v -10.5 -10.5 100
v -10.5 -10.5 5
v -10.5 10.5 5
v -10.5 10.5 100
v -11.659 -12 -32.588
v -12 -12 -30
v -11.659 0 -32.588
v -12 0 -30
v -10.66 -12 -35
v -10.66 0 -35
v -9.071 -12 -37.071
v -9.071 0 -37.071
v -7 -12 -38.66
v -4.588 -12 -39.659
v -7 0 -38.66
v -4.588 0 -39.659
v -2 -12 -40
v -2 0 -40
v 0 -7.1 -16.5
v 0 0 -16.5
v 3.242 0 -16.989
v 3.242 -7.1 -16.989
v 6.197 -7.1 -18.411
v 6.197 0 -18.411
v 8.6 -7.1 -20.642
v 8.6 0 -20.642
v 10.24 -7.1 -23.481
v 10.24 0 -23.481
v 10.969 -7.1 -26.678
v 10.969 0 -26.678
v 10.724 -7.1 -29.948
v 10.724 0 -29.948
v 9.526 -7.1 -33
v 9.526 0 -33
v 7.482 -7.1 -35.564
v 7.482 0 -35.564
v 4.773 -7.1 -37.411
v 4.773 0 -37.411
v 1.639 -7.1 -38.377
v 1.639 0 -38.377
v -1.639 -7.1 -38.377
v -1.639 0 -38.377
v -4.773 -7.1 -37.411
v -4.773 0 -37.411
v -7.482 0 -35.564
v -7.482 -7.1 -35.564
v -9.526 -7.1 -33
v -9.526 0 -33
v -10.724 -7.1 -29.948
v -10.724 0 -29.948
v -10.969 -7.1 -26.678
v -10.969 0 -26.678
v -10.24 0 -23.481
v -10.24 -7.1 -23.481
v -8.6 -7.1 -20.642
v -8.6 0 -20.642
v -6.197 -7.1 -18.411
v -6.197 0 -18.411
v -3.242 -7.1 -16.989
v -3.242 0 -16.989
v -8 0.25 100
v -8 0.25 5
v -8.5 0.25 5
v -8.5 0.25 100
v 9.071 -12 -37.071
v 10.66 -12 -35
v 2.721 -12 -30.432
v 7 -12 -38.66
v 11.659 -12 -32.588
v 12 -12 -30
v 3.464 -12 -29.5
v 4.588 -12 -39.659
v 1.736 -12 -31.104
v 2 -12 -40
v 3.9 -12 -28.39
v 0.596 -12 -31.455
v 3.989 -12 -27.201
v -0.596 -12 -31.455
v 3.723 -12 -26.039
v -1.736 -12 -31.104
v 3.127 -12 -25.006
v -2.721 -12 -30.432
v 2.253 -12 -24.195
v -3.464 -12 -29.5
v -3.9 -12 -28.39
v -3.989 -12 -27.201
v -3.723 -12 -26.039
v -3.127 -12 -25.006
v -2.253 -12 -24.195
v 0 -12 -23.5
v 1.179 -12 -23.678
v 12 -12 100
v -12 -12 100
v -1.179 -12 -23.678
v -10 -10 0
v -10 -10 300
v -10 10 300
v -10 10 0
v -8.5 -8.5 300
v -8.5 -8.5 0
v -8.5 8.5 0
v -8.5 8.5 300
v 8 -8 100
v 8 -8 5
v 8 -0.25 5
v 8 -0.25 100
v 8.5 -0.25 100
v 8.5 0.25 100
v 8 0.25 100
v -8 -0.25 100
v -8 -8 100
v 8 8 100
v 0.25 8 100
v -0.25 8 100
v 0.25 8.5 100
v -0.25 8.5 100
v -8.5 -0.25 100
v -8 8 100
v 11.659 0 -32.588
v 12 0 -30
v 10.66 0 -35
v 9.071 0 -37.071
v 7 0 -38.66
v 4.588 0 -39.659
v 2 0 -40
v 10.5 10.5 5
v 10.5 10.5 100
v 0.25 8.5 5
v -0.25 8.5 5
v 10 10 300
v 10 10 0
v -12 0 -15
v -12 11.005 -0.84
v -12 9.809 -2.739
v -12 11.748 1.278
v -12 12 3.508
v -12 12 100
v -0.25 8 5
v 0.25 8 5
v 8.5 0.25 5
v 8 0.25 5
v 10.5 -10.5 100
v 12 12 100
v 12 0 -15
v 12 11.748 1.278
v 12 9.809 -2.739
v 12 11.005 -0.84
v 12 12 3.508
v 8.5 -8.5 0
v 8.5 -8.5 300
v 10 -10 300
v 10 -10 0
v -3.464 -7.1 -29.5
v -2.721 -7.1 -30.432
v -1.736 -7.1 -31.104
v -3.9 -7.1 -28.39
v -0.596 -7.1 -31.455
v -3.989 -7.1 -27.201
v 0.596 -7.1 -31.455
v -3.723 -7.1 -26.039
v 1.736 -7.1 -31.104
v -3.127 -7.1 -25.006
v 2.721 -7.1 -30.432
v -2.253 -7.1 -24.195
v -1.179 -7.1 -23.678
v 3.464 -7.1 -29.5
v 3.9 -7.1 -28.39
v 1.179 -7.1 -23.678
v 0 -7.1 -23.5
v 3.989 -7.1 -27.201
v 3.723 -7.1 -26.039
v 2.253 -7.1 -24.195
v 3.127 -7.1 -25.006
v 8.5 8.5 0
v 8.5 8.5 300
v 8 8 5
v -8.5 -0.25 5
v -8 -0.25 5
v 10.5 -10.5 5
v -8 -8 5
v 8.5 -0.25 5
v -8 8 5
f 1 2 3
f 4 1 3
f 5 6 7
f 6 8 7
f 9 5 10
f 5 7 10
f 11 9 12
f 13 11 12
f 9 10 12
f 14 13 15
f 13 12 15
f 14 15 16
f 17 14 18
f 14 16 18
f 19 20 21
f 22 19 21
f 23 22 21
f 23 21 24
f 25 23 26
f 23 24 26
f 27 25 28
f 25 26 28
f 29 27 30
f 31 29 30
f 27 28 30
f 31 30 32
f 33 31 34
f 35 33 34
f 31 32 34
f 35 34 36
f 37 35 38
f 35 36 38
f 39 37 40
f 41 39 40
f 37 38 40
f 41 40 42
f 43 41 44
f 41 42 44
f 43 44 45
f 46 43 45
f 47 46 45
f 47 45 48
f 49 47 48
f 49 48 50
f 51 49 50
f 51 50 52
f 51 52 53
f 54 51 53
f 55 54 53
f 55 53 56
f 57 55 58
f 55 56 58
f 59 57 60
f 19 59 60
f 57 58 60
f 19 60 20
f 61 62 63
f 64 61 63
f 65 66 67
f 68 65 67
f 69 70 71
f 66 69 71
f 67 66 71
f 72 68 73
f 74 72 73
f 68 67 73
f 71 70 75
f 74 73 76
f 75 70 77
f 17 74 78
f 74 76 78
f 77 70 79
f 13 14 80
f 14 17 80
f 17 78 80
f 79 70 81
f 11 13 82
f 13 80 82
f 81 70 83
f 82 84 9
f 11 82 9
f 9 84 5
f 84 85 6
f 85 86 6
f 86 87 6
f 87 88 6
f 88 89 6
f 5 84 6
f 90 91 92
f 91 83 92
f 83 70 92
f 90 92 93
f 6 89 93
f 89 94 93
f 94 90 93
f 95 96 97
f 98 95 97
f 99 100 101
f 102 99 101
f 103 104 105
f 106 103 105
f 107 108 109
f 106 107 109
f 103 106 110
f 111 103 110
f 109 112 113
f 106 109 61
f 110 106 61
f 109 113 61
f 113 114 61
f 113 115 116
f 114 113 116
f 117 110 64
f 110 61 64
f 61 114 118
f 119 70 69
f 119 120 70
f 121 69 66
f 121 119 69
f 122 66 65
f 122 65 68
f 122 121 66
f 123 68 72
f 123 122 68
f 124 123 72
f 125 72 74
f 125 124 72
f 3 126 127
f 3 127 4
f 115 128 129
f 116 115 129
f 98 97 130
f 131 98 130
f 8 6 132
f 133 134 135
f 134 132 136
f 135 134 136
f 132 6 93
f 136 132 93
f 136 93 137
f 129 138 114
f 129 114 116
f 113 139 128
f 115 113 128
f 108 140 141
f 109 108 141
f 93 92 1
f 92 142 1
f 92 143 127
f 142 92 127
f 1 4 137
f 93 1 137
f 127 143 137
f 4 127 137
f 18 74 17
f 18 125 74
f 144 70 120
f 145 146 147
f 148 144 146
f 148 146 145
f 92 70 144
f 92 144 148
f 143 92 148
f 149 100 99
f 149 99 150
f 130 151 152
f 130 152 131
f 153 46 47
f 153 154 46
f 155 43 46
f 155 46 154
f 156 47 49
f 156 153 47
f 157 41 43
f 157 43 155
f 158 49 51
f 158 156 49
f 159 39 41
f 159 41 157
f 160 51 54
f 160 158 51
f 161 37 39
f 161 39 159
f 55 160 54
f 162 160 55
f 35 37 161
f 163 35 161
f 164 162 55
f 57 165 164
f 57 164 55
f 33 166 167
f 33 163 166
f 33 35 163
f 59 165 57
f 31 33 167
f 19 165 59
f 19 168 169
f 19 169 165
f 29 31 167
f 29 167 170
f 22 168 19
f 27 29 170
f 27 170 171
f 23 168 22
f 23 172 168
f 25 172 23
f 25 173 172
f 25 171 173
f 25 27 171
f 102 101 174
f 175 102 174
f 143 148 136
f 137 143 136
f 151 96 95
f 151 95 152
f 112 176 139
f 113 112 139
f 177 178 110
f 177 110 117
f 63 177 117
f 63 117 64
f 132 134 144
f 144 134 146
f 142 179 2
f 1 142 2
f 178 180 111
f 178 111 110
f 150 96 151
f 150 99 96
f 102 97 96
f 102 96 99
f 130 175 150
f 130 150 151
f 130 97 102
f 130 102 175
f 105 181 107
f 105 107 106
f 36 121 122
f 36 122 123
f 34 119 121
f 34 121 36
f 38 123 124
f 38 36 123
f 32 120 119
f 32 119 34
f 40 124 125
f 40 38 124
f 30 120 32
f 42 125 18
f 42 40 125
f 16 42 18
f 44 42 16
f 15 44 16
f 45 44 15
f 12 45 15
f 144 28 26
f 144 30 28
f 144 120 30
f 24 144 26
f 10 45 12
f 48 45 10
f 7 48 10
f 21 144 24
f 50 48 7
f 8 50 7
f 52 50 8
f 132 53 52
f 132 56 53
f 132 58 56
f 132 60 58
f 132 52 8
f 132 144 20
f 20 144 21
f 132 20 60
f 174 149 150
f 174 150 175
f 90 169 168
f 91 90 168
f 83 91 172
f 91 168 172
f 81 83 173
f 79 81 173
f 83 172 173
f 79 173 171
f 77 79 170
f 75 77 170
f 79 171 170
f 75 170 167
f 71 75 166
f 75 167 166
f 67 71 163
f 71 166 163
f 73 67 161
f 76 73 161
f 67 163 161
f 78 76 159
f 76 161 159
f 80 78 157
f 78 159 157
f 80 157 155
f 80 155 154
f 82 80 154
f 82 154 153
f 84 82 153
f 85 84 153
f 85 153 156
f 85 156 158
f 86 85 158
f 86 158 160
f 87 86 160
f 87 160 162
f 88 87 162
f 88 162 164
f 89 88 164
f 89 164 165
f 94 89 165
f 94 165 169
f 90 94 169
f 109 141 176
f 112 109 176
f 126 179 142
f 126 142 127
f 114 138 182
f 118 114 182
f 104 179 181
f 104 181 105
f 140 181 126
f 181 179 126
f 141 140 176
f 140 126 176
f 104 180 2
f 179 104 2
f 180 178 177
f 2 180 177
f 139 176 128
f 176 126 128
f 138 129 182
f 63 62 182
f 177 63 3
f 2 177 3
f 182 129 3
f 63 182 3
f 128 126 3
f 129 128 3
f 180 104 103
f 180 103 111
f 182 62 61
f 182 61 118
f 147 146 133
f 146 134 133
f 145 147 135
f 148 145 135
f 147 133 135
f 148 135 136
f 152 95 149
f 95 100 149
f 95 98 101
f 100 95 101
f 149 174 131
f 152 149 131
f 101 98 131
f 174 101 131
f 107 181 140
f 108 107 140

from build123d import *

# Parameters (mm, degrees)
SKETCH1_W           = 20
SKETCH1_H           = 20
SKETCH1_W_2         = 17
SKETCH1_H_2         = 17
BOSS_EXTRUDE1_DEPTH = 300
SKETCH2_W           = 24
SKETCH2_H           = 24
SKETCH2_W_2         = 21
SKETCH2_H_2         = 21
SKETCH2_W_3         = 0.5
SKETCH2_H_3         = 0.5
SKETCH2_W_4         = 16
SKETCH2_H_4         = 16
BOSS_EXTRUDE2_DEPTH = 100
SKETCH3_W           = 24
SKETCH3_H           = 24
BOSS_EXTRUDE3_DEPTH = 5
SKETCH7_W           = 24
SKETCH7_H           = 12
BOSS_EXTRUDE5_DEPTH = 25
FILLET2_R           = 10
SKETCH9_R           = 4
CUT_EXTRUDE1_DEPTH  = 301.479616621
SKETCH9_4_R         = 11
CUT_EXTRUDE2_DEPTH  = 7.1
FILLET3_R           = 10


with BuildPart() as part:
    # Sketch1 → Boss-Extrude1 (new body)
    with BuildSketch(Plane.XY):
        Rectangle(SKETCH1_W, SKETCH1_H)
        Rectangle(SKETCH1_W_2, SKETCH1_H_2, mode=Mode.SUBTRACT)
    extrude(amount=BOSS_EXTRUDE1_DEPTH)


with BuildPart() as body_2:
    # Sketch2 → Boss-Extrude2 (new body)
    # profile 1 of 5: a face of its own
    with BuildSketch(Plane(origin=(0, 0, 0), x_dir=(-1, 0, 0), z_dir=(0, 0, -1))):
        Rectangle(SKETCH2_W, SKETCH2_H)
        Rectangle(SKETCH2_W_2, SKETCH2_H_2, mode=Mode.SUBTRACT)
    # profile 2 of 5: a face of its own
    with BuildSketch(Plane(origin=(0, 0, 0), x_dir=(-1, 0, 0), z_dir=(0, 0, -1))):
        with Locations((-8.25, 0)):
            Rectangle(SKETCH2_W_3, SKETCH2_H_3)
    # profile 3 of 5: a face of its own
    with BuildSketch(Plane(origin=(0, 0, 0), x_dir=(-1, 0, 0), z_dir=(0, 0, -1))):
        with Locations((8.25, 0)):
            Rectangle(SKETCH2_W_3, SKETCH2_H_3)
    # profile 4 of 5: a face of its own
    with BuildSketch(Plane(origin=(0, 0, 0), x_dir=(-1, 0, 0), z_dir=(0, 0, -1))):
        with Locations((0, 8.25)):
            Rectangle(SKETCH2_W_3, SKETCH2_H_3)
    # profile 5 of 5: a face of its own
    with BuildSketch(Plane(origin=(0, 0, 0), x_dir=(-1, 0, 0), z_dir=(0, 0, -1))):
        Rectangle(SKETCH2_W_4, SKETCH2_H_4)
    extrude(amount=-BOSS_EXTRUDE2_DEPTH)

    # Sketch3 → Boss-Extrude3 (add)
    with BuildSketch(Plane(origin=(0, 0, 0), x_dir=(-1, 0, 0), z_dir=(0, 0, -1))):
        Rectangle(SKETCH3_W, SKETCH3_H)
    extrude(amount=-BOSS_EXTRUDE3_DEPTH)

    # Sketch6 → section 0 of loft1
    with BuildSketch(Plane(origin=(0, 0, -15), x_dir=(-1, 0, 0), z_dir=(0, 0, -1)), mode=Mode.PRIVATE) as loft1_s0:
        with BuildLine():
            Line((-12, -12), (12, -12))
            Line((12, -12), (12, 0))
            Line((12, 0), (-12, 0))
            Line((-12, 0), (-12, -12))
        make_face()
    # loft up to a face of the part (loft1)
    loft([loft1_s0.sketch, body_2.faces().sort_by_distance((0, 0, 0))[0]])

    # Sketch7 → Boss-Extrude5 (add)
    with BuildSketch(Plane(origin=(0, 0, -15), x_dir=(-1, 0, 0), z_dir=(0, 0, -1))):
        with Locations((0, -6)):
            Rectangle(SKETCH7_W, SKETCH7_H)
    extrude(amount=BOSS_EXTRUDE5_DEPTH)

    # Fillet2
    fillet2_edges = [body_2.edges().sort_by_distance(p)[0] for p in [
        (-12, -6, -40),
        (12, -6, -40),
    ]]
    fillet(fillet2_edges, radius=FILLET2_R)

    # Sketch9 → Cut-Extrude1 (cut, through all)
    with BuildSketch(Plane(origin=(0, 0, 0), x_dir=(1, 0, 0), z_dir=(0, 1, 0))):
        with Locations(Location((0, 27.5, 0), (0, 0, 270))):
            Circle(SKETCH9_R)
    extrude(amount=-CUT_EXTRUDE1_DEPTH, mode=Mode.SUBTRACT)

    # Sketch9<4> → Cut-Extrude2 (cut)
    with BuildSketch(Plane(origin=(0, 0, 0), x_dir=(1, 0, 0), z_dir=(0, 1, 0))):
        with Locations(Location((0, 27.5, 0), (0, 0, 270))):
            Circle(SKETCH9_4_R)
    extrude(amount=-CUT_EXTRUDE2_DEPTH, mode=Mode.SUBTRACT)

    # Fillet3
    fillet3_edges = [body_2.edges().sort_by_distance(p)[0] for p in [
        (0, 12, 0),
    ]]
    fillet(fillet3_edges, radius=FILLET3_R)


solid = Compound([part.part, body_2.part])
